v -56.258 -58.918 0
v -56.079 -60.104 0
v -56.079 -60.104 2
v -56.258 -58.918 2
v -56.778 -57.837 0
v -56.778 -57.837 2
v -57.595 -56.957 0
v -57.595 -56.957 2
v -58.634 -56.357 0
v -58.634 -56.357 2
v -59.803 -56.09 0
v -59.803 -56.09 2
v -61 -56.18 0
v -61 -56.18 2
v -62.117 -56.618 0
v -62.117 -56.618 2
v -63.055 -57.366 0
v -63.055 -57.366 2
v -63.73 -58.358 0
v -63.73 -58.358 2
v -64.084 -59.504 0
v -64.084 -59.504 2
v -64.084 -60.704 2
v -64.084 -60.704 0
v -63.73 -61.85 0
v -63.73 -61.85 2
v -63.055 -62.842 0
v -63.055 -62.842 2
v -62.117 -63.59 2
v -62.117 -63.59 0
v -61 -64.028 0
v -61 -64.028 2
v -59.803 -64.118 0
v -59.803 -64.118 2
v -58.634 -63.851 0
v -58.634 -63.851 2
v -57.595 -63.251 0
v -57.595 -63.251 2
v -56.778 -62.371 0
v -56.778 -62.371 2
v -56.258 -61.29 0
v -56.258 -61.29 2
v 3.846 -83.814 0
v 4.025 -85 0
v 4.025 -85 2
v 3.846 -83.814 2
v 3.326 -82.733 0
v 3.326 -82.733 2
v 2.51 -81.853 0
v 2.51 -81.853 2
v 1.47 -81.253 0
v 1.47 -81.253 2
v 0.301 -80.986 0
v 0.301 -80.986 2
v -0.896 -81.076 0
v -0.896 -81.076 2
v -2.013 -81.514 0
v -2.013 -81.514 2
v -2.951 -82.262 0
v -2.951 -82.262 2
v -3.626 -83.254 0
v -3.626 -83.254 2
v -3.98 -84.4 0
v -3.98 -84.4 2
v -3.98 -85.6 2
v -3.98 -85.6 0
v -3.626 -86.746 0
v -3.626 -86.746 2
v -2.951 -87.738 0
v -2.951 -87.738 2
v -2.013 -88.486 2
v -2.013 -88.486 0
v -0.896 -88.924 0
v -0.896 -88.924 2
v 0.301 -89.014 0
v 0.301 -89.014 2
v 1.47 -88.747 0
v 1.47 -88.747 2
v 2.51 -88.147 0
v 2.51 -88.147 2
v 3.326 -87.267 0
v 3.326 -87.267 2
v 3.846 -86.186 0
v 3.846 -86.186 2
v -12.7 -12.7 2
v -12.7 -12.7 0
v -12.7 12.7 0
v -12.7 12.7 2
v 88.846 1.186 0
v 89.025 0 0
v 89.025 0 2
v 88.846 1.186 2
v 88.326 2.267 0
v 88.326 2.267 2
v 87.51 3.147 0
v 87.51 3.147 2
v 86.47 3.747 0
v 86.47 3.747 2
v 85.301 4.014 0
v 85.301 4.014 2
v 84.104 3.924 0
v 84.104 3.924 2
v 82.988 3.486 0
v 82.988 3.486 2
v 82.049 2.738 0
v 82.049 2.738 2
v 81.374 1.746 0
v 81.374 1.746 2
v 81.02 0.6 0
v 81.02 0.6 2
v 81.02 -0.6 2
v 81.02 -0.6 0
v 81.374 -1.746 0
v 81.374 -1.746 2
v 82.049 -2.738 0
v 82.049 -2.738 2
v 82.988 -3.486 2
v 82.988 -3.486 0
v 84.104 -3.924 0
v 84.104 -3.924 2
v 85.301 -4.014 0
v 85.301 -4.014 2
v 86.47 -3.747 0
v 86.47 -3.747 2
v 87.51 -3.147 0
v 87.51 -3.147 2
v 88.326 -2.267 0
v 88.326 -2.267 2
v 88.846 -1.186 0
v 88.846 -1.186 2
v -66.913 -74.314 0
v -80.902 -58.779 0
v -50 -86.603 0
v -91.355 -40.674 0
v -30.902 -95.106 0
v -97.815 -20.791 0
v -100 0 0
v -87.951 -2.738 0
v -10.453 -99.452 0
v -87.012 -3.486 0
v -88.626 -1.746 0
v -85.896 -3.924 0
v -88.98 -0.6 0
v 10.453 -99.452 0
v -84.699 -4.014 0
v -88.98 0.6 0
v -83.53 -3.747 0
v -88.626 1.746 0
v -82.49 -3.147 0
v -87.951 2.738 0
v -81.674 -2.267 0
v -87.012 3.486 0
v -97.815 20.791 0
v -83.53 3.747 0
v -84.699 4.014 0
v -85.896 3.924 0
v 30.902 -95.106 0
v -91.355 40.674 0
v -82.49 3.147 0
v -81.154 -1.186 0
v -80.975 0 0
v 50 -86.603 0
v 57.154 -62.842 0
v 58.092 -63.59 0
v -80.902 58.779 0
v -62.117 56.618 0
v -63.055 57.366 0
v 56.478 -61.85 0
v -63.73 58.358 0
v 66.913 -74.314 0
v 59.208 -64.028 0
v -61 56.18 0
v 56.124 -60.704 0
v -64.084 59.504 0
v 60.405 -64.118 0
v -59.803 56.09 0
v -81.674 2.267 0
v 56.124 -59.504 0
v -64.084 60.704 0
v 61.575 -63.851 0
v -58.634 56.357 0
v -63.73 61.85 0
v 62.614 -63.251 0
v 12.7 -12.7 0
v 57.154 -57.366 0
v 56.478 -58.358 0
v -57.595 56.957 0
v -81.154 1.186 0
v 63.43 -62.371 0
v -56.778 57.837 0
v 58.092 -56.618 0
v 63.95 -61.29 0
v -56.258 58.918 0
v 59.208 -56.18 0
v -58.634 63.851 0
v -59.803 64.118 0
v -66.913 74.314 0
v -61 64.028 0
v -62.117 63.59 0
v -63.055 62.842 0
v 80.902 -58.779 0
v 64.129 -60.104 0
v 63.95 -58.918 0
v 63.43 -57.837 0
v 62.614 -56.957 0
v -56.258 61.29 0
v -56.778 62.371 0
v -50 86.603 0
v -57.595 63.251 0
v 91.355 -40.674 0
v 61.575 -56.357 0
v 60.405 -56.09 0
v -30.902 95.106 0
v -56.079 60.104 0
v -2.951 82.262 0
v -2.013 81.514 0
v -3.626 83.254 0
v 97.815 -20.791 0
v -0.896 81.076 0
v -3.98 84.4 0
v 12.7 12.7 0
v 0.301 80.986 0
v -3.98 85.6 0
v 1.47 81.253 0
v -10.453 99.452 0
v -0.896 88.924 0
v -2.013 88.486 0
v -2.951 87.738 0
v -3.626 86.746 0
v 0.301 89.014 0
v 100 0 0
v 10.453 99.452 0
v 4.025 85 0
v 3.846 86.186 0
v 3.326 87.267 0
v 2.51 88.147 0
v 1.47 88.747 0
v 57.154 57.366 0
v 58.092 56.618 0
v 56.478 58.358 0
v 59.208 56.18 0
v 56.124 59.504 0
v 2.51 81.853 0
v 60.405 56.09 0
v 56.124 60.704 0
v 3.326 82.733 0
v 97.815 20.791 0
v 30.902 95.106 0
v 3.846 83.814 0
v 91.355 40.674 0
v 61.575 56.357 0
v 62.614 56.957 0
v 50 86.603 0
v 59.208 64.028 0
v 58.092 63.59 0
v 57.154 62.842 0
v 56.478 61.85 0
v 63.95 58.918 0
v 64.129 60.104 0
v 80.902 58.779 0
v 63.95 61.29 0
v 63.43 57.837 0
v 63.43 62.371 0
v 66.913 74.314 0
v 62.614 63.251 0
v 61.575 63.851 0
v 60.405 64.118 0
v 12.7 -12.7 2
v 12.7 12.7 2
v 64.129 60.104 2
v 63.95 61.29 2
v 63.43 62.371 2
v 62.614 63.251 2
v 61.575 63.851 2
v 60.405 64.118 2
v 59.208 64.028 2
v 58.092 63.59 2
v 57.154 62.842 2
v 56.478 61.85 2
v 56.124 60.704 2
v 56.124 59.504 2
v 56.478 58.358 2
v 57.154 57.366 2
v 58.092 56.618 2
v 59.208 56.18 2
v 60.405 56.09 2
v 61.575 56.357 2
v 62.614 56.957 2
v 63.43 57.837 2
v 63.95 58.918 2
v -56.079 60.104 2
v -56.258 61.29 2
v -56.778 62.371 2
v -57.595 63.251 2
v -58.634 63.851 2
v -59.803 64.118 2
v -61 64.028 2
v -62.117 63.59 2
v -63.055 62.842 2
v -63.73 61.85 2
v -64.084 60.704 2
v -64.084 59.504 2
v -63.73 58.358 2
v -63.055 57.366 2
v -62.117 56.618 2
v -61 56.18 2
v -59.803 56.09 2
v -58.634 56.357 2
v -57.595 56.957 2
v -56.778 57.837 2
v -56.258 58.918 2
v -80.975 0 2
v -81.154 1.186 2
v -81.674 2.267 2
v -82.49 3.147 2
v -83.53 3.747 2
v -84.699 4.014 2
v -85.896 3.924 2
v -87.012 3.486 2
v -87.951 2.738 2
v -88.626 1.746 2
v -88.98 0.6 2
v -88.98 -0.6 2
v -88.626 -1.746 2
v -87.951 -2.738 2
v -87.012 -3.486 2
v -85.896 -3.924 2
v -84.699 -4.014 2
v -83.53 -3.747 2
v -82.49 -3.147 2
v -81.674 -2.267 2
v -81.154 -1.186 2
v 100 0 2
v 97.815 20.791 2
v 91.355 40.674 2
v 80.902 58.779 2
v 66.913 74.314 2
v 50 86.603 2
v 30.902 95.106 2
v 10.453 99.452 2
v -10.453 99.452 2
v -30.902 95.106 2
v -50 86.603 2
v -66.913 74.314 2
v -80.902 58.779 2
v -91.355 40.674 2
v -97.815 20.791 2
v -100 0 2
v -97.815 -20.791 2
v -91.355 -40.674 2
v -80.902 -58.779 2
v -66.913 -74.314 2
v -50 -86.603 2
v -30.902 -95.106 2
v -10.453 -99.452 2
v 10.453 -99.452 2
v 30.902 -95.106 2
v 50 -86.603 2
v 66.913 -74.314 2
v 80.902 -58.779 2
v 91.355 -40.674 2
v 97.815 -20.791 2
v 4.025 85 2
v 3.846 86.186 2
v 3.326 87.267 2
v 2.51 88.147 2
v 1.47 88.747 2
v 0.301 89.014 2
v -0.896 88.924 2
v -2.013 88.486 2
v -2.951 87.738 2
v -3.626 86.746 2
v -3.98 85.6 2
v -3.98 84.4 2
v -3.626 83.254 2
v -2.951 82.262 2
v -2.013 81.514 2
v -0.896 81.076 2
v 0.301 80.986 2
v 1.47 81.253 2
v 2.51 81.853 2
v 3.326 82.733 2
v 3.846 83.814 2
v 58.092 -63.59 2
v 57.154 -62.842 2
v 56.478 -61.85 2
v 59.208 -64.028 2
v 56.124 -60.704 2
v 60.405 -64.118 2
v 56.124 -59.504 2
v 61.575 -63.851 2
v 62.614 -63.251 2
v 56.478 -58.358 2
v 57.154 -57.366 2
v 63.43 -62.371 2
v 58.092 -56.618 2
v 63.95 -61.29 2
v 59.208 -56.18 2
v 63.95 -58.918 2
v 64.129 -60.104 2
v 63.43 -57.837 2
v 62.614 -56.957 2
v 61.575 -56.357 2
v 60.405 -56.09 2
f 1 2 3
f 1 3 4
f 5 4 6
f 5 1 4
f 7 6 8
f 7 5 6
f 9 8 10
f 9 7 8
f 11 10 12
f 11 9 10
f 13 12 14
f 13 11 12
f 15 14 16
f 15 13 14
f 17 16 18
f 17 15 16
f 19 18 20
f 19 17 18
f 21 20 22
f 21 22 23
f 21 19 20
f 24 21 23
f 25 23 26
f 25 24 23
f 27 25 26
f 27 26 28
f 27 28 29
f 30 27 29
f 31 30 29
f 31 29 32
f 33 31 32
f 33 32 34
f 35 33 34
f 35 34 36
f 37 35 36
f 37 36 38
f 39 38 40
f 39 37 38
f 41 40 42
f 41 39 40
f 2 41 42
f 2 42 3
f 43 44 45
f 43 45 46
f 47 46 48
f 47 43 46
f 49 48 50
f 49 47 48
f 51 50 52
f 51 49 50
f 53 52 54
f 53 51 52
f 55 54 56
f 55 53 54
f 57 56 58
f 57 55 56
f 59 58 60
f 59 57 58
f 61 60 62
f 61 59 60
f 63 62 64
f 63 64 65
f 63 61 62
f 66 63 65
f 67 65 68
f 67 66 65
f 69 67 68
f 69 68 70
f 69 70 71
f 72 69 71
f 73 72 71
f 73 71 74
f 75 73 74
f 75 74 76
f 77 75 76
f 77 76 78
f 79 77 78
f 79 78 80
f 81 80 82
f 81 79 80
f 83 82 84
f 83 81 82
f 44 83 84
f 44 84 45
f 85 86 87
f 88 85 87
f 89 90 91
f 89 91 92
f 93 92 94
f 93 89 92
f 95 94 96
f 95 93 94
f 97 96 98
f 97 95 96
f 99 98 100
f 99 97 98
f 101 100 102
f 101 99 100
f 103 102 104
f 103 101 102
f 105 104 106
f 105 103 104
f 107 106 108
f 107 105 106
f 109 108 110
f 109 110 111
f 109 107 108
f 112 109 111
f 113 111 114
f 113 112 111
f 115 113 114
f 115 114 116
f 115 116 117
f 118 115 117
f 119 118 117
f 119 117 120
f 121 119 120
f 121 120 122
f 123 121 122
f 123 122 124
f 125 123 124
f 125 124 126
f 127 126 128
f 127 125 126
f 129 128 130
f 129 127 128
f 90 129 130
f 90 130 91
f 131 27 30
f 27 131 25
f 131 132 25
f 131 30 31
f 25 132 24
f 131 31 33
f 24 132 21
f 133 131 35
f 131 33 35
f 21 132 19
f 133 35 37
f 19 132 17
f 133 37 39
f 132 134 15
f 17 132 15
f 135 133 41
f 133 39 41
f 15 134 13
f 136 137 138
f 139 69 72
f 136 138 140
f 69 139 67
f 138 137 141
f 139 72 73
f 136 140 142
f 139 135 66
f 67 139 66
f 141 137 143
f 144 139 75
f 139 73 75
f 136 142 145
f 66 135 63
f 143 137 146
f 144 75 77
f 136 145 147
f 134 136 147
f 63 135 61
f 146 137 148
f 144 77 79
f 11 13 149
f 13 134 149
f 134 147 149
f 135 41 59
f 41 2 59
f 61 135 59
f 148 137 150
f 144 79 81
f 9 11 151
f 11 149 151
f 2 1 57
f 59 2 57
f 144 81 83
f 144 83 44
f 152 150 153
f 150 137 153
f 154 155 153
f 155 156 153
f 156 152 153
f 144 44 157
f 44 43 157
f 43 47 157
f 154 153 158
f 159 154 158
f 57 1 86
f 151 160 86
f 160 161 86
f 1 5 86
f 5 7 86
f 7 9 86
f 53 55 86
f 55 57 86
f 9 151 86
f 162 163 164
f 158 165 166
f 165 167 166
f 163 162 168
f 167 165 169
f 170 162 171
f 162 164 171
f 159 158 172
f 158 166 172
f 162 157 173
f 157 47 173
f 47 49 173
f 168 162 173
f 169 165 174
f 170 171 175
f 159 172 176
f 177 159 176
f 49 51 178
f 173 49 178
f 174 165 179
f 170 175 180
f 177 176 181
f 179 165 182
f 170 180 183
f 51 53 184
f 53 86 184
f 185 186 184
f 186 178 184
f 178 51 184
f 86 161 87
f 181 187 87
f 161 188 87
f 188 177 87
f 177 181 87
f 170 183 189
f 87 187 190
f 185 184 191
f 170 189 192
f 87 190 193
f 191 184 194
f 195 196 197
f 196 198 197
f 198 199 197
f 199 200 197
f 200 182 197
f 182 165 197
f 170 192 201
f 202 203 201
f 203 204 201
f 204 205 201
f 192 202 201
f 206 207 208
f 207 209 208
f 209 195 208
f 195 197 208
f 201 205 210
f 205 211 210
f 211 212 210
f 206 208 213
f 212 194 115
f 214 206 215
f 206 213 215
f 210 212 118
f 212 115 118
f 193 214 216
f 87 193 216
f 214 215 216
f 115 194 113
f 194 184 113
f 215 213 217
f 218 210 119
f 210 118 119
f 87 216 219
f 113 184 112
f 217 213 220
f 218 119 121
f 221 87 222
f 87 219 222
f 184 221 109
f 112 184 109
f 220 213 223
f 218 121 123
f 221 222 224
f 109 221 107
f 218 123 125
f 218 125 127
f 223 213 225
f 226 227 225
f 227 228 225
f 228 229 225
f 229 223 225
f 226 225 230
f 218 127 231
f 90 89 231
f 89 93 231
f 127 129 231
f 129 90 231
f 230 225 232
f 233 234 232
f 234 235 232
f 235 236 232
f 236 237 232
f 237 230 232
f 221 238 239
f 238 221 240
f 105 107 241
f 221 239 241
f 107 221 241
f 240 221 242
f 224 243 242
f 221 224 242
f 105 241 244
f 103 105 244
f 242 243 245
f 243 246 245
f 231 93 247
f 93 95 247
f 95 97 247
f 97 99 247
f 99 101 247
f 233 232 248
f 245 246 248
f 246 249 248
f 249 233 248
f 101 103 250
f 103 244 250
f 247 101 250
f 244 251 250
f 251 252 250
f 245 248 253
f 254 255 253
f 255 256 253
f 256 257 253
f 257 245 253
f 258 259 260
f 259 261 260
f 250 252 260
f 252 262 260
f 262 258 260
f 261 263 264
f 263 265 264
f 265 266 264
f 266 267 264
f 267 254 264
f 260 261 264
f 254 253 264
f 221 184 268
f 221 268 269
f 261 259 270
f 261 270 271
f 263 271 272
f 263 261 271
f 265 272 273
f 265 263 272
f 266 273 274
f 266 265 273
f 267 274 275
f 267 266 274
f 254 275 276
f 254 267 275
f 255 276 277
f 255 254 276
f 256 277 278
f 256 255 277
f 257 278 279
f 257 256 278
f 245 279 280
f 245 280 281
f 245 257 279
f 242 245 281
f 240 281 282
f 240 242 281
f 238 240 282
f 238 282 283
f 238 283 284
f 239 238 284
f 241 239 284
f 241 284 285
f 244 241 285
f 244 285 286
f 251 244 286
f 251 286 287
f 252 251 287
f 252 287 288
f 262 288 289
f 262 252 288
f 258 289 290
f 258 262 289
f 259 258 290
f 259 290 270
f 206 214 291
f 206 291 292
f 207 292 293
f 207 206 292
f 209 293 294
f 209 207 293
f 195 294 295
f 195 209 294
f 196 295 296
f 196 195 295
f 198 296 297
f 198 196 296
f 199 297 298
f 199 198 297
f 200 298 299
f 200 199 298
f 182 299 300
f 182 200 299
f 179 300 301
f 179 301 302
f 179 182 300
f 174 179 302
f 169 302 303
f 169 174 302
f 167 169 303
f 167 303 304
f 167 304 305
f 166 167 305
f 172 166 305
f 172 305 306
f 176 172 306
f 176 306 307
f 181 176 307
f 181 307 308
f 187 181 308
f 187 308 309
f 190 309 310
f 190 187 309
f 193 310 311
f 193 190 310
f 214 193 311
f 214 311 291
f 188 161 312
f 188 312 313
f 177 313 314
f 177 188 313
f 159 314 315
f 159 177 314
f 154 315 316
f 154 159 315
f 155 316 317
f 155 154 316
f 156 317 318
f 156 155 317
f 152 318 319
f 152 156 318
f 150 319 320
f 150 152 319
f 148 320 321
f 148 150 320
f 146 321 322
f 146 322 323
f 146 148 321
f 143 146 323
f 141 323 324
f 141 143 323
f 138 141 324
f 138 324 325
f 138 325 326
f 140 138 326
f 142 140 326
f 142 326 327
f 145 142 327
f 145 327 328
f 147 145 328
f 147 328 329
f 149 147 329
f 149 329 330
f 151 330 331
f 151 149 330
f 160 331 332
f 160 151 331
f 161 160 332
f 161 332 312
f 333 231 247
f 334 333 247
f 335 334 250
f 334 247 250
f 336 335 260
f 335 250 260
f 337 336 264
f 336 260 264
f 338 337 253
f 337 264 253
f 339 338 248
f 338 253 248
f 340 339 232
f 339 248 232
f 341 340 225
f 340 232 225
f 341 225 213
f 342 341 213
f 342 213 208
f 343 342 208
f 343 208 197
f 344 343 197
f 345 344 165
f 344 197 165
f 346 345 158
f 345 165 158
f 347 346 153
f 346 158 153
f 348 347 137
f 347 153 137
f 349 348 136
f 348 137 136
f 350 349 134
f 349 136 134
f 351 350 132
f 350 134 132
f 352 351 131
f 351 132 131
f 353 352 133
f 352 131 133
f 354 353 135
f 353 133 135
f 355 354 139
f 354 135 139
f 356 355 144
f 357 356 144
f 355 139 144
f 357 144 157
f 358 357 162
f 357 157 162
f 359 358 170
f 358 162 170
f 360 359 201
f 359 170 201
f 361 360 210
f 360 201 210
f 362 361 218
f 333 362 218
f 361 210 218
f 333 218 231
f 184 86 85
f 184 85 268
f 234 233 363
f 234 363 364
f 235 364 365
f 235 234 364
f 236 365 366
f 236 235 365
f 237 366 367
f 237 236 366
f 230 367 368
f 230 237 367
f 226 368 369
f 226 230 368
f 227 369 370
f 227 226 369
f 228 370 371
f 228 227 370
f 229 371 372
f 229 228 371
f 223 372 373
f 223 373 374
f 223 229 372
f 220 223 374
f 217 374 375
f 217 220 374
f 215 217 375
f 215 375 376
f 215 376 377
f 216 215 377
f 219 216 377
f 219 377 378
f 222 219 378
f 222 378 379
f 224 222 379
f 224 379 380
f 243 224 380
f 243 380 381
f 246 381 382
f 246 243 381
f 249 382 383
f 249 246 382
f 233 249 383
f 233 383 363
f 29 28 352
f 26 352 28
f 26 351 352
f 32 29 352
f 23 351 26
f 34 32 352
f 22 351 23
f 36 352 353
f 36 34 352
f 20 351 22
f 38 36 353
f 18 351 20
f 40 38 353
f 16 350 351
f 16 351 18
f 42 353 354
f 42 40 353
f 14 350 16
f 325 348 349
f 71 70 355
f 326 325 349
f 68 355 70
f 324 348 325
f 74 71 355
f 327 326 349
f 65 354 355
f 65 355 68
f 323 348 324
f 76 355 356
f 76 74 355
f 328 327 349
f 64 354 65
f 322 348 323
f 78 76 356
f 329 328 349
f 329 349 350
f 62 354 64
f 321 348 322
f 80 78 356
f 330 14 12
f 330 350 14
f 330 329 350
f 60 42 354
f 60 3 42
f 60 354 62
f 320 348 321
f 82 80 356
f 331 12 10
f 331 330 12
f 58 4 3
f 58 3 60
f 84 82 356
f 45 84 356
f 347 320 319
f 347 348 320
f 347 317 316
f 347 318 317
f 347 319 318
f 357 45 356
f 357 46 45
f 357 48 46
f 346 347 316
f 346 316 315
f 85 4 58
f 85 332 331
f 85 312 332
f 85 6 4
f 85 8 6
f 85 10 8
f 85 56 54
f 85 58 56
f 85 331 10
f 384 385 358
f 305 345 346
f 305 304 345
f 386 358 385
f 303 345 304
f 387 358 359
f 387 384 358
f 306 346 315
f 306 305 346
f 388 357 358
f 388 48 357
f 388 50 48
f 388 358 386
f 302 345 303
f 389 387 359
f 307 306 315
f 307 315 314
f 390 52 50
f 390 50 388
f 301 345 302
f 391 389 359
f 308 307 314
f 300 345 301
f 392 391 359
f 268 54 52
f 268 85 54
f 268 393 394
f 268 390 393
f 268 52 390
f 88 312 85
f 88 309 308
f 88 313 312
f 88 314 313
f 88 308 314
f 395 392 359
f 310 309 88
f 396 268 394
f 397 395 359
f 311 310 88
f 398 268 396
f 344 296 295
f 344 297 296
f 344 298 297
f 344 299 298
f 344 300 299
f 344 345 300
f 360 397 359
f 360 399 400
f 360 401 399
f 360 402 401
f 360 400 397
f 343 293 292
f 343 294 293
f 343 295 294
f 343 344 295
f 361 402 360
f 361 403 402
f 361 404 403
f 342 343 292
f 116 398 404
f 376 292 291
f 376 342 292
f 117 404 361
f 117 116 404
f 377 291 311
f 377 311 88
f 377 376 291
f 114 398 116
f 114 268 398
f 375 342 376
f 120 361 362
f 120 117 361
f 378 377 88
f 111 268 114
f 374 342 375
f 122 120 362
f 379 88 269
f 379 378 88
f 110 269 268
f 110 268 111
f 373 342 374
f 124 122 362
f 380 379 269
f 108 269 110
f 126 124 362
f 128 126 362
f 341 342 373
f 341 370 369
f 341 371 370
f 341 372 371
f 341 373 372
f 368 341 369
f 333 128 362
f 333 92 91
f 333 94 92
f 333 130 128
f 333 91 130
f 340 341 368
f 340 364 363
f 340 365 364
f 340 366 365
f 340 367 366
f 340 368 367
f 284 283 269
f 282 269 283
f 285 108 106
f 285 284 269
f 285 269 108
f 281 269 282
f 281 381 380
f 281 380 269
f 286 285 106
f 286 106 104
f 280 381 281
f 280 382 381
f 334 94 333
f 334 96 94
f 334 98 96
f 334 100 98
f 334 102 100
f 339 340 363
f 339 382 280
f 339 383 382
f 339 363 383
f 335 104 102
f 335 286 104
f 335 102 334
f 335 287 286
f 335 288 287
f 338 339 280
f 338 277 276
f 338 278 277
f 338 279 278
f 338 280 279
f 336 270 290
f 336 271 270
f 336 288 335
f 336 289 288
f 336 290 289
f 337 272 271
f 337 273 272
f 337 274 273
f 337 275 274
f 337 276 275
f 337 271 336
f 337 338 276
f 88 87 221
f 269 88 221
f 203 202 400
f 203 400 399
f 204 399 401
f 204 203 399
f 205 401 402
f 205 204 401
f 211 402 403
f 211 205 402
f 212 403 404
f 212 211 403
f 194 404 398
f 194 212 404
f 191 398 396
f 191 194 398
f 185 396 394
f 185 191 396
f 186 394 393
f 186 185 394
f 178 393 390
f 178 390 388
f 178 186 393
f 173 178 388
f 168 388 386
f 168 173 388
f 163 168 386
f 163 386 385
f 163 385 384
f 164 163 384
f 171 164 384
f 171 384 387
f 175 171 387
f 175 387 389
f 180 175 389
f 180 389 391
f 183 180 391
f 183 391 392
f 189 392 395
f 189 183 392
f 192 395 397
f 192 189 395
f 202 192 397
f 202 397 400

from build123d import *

# Parameters (mm, degrees)
CROQUIS1_R              = 100
CROQUIS1_R_2            = 4.025
CROQUIS1_W              = 25.4
CROQUIS1_H              = 25.4
SALIENTE_EXTRUIR1_DEPTH = 2


with BuildPart() as part:
    # Croquis1 → Saliente-Extruir1 (new body)
    with BuildSketch(Plane.XY):
        Circle(CROQUIS1_R)
        with Locations((0, 85)):
            Circle(CROQUIS1_R_2, mode=Mode.SUBTRACT)
        with Locations((60.104076401, 60.104076401)):
            Circle(CROQUIS1_R_2, mode=Mode.SUBTRACT)
        with Locations((85, 0)):
            Circle(CROQUIS1_R_2, mode=Mode.SUBTRACT)
        with Locations((60.104076401, -60.104076401)):
            Circle(CROQUIS1_R_2, mode=Mode.SUBTRACT)
        with Locations((0, -85)):
            Circle(CROQUIS1_R_2, mode=Mode.SUBTRACT)
        with Locations((-60.104076401, -60.104076401)):
            Circle(CROQUIS1_R_2, mode=Mode.SUBTRACT)
        with Locations((-85, 0)):
            Circle(CROQUIS1_R_2, mode=Mode.SUBTRACT)
        with Locations((-60.104076401, 60.104076401)):
            Circle(CROQUIS1_R_2, mode=Mode.SUBTRACT)
        Rectangle(CROQUIS1_W, CROQUIS1_H, mode=Mode.SUBTRACT)
    extrude(amount=SALIENTE_EXTRUIR1_DEPTH)


solid = part.part
